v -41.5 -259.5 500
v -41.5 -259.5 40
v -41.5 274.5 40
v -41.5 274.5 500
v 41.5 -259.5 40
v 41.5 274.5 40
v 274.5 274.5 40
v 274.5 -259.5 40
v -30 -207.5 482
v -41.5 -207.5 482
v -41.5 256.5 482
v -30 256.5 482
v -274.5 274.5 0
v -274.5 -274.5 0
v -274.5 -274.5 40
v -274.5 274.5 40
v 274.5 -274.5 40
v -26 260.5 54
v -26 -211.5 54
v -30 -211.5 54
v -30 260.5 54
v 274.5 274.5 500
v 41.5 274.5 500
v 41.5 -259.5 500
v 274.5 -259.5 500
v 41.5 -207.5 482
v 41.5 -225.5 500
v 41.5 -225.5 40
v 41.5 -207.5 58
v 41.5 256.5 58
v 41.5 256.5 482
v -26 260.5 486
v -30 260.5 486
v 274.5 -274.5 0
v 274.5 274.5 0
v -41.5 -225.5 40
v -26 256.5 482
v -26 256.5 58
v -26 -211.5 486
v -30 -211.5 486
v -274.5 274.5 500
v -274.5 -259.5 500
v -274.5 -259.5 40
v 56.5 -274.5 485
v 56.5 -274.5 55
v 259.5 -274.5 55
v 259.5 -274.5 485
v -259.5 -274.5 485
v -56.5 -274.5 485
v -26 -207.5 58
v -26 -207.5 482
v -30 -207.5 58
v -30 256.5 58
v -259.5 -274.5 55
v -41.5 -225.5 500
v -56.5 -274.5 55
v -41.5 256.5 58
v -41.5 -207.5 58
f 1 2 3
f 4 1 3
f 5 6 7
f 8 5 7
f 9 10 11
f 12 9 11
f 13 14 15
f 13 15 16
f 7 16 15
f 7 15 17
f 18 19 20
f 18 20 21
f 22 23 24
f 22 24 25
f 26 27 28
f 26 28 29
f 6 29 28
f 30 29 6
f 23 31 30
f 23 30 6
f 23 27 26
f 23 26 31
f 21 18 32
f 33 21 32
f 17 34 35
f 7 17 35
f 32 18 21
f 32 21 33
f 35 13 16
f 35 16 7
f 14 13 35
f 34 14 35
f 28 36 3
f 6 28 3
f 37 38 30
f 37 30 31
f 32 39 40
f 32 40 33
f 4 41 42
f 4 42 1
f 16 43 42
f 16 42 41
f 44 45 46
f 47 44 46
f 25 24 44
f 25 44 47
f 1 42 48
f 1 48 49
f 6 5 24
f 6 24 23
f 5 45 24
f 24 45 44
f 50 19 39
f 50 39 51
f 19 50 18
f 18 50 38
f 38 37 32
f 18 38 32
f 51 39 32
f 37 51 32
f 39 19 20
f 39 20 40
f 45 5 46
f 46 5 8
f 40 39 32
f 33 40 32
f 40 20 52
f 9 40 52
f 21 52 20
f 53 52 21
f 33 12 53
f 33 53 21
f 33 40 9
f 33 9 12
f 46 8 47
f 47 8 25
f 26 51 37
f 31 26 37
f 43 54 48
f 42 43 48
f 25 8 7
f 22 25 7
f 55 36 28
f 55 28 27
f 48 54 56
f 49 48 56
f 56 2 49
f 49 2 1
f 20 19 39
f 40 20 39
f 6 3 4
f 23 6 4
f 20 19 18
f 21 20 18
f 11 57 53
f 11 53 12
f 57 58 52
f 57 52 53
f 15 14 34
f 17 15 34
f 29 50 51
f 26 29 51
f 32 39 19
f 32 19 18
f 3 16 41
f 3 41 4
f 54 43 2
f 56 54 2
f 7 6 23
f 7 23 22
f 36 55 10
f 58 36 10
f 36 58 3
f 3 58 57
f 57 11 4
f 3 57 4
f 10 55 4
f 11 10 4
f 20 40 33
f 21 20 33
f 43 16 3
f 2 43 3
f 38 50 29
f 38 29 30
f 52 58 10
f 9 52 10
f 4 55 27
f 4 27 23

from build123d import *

# Parameters (mm, degrees)
F0_W     = 549
F0_H     = 549
F1_DEPTH = 40
F2_W     = 233
F2_H     = 549
F3_DEPTH = 460
F4_SIZE  = 15
F5_W     = 500
F5_H     = 460
F5_W_2   = 464
F5_H_2   = 424
F6_DEPTH = 83
F8_START = -26
F7_W     = 472
F7_H     = 432
F8_DEPTH = 4


with BuildPart() as f1:
    # F0 (on Top) → F1 (new body)
    with BuildSketch(Plane.XY):
        Rectangle(F0_W, F0_H)
    extrude(amount=F1_DEPTH)


with BuildPart() as f3:
    # F2 (on face) → F3 (new body)
    with BuildSketch(Plane.XY.offset(40)):
        with Locations((-158, 0)):
            Rectangle(F2_W, F2_H)
        with Locations((158, 0)):
            Rectangle(F2_W, F2_H)
    extrude(amount=F3_DEPTH)

    # F4
    f4_edges = [f3.edges().sort_by_distance(p)[0] for p in [
        (41.5, -274.5, 270),
        (274.5, -274.5, 270),
        (158, -274.5, 40),
        (158, -274.5, 500),
        (-274.5, -274.5, 270),
        (-41.5, -274.5, 270),
        (-158, -274.5, 40),
        (-158, -274.5, 500),
    ]]
    chamfer(f4_edges, length=F4_SIZE)


with BuildPart() as f6:
    # F5 (on face) → F6 (new body)
    with BuildSketch(Plane.YZ.offset(-41.5)):
        with Locations((24.5, 270)):
            Rectangle(F5_W, F5_H)
        with Locations((24.5, 270)):
            Rectangle(F5_W_2, F5_H_2, mode=Mode.SUBTRACT)
    extrude(amount=F6_DEPTH)


with BuildPart() as f8:
    # F7 (on Right) → F8 (new body)
    with BuildSketch(Plane.YZ.offset(F8_START)):
        with Locations((24.5, 270)):
            Rectangle(F7_W, F7_H)
    extrude(amount=-F8_DEPTH)


with BuildPart() as f6_1:
    add(f6.part)

    # F9: cut F8
    add(f8.part, mode=Mode.SUBTRACT)


solid = Compound([f1.part, f3.part, f8.part, f6_1.part])
